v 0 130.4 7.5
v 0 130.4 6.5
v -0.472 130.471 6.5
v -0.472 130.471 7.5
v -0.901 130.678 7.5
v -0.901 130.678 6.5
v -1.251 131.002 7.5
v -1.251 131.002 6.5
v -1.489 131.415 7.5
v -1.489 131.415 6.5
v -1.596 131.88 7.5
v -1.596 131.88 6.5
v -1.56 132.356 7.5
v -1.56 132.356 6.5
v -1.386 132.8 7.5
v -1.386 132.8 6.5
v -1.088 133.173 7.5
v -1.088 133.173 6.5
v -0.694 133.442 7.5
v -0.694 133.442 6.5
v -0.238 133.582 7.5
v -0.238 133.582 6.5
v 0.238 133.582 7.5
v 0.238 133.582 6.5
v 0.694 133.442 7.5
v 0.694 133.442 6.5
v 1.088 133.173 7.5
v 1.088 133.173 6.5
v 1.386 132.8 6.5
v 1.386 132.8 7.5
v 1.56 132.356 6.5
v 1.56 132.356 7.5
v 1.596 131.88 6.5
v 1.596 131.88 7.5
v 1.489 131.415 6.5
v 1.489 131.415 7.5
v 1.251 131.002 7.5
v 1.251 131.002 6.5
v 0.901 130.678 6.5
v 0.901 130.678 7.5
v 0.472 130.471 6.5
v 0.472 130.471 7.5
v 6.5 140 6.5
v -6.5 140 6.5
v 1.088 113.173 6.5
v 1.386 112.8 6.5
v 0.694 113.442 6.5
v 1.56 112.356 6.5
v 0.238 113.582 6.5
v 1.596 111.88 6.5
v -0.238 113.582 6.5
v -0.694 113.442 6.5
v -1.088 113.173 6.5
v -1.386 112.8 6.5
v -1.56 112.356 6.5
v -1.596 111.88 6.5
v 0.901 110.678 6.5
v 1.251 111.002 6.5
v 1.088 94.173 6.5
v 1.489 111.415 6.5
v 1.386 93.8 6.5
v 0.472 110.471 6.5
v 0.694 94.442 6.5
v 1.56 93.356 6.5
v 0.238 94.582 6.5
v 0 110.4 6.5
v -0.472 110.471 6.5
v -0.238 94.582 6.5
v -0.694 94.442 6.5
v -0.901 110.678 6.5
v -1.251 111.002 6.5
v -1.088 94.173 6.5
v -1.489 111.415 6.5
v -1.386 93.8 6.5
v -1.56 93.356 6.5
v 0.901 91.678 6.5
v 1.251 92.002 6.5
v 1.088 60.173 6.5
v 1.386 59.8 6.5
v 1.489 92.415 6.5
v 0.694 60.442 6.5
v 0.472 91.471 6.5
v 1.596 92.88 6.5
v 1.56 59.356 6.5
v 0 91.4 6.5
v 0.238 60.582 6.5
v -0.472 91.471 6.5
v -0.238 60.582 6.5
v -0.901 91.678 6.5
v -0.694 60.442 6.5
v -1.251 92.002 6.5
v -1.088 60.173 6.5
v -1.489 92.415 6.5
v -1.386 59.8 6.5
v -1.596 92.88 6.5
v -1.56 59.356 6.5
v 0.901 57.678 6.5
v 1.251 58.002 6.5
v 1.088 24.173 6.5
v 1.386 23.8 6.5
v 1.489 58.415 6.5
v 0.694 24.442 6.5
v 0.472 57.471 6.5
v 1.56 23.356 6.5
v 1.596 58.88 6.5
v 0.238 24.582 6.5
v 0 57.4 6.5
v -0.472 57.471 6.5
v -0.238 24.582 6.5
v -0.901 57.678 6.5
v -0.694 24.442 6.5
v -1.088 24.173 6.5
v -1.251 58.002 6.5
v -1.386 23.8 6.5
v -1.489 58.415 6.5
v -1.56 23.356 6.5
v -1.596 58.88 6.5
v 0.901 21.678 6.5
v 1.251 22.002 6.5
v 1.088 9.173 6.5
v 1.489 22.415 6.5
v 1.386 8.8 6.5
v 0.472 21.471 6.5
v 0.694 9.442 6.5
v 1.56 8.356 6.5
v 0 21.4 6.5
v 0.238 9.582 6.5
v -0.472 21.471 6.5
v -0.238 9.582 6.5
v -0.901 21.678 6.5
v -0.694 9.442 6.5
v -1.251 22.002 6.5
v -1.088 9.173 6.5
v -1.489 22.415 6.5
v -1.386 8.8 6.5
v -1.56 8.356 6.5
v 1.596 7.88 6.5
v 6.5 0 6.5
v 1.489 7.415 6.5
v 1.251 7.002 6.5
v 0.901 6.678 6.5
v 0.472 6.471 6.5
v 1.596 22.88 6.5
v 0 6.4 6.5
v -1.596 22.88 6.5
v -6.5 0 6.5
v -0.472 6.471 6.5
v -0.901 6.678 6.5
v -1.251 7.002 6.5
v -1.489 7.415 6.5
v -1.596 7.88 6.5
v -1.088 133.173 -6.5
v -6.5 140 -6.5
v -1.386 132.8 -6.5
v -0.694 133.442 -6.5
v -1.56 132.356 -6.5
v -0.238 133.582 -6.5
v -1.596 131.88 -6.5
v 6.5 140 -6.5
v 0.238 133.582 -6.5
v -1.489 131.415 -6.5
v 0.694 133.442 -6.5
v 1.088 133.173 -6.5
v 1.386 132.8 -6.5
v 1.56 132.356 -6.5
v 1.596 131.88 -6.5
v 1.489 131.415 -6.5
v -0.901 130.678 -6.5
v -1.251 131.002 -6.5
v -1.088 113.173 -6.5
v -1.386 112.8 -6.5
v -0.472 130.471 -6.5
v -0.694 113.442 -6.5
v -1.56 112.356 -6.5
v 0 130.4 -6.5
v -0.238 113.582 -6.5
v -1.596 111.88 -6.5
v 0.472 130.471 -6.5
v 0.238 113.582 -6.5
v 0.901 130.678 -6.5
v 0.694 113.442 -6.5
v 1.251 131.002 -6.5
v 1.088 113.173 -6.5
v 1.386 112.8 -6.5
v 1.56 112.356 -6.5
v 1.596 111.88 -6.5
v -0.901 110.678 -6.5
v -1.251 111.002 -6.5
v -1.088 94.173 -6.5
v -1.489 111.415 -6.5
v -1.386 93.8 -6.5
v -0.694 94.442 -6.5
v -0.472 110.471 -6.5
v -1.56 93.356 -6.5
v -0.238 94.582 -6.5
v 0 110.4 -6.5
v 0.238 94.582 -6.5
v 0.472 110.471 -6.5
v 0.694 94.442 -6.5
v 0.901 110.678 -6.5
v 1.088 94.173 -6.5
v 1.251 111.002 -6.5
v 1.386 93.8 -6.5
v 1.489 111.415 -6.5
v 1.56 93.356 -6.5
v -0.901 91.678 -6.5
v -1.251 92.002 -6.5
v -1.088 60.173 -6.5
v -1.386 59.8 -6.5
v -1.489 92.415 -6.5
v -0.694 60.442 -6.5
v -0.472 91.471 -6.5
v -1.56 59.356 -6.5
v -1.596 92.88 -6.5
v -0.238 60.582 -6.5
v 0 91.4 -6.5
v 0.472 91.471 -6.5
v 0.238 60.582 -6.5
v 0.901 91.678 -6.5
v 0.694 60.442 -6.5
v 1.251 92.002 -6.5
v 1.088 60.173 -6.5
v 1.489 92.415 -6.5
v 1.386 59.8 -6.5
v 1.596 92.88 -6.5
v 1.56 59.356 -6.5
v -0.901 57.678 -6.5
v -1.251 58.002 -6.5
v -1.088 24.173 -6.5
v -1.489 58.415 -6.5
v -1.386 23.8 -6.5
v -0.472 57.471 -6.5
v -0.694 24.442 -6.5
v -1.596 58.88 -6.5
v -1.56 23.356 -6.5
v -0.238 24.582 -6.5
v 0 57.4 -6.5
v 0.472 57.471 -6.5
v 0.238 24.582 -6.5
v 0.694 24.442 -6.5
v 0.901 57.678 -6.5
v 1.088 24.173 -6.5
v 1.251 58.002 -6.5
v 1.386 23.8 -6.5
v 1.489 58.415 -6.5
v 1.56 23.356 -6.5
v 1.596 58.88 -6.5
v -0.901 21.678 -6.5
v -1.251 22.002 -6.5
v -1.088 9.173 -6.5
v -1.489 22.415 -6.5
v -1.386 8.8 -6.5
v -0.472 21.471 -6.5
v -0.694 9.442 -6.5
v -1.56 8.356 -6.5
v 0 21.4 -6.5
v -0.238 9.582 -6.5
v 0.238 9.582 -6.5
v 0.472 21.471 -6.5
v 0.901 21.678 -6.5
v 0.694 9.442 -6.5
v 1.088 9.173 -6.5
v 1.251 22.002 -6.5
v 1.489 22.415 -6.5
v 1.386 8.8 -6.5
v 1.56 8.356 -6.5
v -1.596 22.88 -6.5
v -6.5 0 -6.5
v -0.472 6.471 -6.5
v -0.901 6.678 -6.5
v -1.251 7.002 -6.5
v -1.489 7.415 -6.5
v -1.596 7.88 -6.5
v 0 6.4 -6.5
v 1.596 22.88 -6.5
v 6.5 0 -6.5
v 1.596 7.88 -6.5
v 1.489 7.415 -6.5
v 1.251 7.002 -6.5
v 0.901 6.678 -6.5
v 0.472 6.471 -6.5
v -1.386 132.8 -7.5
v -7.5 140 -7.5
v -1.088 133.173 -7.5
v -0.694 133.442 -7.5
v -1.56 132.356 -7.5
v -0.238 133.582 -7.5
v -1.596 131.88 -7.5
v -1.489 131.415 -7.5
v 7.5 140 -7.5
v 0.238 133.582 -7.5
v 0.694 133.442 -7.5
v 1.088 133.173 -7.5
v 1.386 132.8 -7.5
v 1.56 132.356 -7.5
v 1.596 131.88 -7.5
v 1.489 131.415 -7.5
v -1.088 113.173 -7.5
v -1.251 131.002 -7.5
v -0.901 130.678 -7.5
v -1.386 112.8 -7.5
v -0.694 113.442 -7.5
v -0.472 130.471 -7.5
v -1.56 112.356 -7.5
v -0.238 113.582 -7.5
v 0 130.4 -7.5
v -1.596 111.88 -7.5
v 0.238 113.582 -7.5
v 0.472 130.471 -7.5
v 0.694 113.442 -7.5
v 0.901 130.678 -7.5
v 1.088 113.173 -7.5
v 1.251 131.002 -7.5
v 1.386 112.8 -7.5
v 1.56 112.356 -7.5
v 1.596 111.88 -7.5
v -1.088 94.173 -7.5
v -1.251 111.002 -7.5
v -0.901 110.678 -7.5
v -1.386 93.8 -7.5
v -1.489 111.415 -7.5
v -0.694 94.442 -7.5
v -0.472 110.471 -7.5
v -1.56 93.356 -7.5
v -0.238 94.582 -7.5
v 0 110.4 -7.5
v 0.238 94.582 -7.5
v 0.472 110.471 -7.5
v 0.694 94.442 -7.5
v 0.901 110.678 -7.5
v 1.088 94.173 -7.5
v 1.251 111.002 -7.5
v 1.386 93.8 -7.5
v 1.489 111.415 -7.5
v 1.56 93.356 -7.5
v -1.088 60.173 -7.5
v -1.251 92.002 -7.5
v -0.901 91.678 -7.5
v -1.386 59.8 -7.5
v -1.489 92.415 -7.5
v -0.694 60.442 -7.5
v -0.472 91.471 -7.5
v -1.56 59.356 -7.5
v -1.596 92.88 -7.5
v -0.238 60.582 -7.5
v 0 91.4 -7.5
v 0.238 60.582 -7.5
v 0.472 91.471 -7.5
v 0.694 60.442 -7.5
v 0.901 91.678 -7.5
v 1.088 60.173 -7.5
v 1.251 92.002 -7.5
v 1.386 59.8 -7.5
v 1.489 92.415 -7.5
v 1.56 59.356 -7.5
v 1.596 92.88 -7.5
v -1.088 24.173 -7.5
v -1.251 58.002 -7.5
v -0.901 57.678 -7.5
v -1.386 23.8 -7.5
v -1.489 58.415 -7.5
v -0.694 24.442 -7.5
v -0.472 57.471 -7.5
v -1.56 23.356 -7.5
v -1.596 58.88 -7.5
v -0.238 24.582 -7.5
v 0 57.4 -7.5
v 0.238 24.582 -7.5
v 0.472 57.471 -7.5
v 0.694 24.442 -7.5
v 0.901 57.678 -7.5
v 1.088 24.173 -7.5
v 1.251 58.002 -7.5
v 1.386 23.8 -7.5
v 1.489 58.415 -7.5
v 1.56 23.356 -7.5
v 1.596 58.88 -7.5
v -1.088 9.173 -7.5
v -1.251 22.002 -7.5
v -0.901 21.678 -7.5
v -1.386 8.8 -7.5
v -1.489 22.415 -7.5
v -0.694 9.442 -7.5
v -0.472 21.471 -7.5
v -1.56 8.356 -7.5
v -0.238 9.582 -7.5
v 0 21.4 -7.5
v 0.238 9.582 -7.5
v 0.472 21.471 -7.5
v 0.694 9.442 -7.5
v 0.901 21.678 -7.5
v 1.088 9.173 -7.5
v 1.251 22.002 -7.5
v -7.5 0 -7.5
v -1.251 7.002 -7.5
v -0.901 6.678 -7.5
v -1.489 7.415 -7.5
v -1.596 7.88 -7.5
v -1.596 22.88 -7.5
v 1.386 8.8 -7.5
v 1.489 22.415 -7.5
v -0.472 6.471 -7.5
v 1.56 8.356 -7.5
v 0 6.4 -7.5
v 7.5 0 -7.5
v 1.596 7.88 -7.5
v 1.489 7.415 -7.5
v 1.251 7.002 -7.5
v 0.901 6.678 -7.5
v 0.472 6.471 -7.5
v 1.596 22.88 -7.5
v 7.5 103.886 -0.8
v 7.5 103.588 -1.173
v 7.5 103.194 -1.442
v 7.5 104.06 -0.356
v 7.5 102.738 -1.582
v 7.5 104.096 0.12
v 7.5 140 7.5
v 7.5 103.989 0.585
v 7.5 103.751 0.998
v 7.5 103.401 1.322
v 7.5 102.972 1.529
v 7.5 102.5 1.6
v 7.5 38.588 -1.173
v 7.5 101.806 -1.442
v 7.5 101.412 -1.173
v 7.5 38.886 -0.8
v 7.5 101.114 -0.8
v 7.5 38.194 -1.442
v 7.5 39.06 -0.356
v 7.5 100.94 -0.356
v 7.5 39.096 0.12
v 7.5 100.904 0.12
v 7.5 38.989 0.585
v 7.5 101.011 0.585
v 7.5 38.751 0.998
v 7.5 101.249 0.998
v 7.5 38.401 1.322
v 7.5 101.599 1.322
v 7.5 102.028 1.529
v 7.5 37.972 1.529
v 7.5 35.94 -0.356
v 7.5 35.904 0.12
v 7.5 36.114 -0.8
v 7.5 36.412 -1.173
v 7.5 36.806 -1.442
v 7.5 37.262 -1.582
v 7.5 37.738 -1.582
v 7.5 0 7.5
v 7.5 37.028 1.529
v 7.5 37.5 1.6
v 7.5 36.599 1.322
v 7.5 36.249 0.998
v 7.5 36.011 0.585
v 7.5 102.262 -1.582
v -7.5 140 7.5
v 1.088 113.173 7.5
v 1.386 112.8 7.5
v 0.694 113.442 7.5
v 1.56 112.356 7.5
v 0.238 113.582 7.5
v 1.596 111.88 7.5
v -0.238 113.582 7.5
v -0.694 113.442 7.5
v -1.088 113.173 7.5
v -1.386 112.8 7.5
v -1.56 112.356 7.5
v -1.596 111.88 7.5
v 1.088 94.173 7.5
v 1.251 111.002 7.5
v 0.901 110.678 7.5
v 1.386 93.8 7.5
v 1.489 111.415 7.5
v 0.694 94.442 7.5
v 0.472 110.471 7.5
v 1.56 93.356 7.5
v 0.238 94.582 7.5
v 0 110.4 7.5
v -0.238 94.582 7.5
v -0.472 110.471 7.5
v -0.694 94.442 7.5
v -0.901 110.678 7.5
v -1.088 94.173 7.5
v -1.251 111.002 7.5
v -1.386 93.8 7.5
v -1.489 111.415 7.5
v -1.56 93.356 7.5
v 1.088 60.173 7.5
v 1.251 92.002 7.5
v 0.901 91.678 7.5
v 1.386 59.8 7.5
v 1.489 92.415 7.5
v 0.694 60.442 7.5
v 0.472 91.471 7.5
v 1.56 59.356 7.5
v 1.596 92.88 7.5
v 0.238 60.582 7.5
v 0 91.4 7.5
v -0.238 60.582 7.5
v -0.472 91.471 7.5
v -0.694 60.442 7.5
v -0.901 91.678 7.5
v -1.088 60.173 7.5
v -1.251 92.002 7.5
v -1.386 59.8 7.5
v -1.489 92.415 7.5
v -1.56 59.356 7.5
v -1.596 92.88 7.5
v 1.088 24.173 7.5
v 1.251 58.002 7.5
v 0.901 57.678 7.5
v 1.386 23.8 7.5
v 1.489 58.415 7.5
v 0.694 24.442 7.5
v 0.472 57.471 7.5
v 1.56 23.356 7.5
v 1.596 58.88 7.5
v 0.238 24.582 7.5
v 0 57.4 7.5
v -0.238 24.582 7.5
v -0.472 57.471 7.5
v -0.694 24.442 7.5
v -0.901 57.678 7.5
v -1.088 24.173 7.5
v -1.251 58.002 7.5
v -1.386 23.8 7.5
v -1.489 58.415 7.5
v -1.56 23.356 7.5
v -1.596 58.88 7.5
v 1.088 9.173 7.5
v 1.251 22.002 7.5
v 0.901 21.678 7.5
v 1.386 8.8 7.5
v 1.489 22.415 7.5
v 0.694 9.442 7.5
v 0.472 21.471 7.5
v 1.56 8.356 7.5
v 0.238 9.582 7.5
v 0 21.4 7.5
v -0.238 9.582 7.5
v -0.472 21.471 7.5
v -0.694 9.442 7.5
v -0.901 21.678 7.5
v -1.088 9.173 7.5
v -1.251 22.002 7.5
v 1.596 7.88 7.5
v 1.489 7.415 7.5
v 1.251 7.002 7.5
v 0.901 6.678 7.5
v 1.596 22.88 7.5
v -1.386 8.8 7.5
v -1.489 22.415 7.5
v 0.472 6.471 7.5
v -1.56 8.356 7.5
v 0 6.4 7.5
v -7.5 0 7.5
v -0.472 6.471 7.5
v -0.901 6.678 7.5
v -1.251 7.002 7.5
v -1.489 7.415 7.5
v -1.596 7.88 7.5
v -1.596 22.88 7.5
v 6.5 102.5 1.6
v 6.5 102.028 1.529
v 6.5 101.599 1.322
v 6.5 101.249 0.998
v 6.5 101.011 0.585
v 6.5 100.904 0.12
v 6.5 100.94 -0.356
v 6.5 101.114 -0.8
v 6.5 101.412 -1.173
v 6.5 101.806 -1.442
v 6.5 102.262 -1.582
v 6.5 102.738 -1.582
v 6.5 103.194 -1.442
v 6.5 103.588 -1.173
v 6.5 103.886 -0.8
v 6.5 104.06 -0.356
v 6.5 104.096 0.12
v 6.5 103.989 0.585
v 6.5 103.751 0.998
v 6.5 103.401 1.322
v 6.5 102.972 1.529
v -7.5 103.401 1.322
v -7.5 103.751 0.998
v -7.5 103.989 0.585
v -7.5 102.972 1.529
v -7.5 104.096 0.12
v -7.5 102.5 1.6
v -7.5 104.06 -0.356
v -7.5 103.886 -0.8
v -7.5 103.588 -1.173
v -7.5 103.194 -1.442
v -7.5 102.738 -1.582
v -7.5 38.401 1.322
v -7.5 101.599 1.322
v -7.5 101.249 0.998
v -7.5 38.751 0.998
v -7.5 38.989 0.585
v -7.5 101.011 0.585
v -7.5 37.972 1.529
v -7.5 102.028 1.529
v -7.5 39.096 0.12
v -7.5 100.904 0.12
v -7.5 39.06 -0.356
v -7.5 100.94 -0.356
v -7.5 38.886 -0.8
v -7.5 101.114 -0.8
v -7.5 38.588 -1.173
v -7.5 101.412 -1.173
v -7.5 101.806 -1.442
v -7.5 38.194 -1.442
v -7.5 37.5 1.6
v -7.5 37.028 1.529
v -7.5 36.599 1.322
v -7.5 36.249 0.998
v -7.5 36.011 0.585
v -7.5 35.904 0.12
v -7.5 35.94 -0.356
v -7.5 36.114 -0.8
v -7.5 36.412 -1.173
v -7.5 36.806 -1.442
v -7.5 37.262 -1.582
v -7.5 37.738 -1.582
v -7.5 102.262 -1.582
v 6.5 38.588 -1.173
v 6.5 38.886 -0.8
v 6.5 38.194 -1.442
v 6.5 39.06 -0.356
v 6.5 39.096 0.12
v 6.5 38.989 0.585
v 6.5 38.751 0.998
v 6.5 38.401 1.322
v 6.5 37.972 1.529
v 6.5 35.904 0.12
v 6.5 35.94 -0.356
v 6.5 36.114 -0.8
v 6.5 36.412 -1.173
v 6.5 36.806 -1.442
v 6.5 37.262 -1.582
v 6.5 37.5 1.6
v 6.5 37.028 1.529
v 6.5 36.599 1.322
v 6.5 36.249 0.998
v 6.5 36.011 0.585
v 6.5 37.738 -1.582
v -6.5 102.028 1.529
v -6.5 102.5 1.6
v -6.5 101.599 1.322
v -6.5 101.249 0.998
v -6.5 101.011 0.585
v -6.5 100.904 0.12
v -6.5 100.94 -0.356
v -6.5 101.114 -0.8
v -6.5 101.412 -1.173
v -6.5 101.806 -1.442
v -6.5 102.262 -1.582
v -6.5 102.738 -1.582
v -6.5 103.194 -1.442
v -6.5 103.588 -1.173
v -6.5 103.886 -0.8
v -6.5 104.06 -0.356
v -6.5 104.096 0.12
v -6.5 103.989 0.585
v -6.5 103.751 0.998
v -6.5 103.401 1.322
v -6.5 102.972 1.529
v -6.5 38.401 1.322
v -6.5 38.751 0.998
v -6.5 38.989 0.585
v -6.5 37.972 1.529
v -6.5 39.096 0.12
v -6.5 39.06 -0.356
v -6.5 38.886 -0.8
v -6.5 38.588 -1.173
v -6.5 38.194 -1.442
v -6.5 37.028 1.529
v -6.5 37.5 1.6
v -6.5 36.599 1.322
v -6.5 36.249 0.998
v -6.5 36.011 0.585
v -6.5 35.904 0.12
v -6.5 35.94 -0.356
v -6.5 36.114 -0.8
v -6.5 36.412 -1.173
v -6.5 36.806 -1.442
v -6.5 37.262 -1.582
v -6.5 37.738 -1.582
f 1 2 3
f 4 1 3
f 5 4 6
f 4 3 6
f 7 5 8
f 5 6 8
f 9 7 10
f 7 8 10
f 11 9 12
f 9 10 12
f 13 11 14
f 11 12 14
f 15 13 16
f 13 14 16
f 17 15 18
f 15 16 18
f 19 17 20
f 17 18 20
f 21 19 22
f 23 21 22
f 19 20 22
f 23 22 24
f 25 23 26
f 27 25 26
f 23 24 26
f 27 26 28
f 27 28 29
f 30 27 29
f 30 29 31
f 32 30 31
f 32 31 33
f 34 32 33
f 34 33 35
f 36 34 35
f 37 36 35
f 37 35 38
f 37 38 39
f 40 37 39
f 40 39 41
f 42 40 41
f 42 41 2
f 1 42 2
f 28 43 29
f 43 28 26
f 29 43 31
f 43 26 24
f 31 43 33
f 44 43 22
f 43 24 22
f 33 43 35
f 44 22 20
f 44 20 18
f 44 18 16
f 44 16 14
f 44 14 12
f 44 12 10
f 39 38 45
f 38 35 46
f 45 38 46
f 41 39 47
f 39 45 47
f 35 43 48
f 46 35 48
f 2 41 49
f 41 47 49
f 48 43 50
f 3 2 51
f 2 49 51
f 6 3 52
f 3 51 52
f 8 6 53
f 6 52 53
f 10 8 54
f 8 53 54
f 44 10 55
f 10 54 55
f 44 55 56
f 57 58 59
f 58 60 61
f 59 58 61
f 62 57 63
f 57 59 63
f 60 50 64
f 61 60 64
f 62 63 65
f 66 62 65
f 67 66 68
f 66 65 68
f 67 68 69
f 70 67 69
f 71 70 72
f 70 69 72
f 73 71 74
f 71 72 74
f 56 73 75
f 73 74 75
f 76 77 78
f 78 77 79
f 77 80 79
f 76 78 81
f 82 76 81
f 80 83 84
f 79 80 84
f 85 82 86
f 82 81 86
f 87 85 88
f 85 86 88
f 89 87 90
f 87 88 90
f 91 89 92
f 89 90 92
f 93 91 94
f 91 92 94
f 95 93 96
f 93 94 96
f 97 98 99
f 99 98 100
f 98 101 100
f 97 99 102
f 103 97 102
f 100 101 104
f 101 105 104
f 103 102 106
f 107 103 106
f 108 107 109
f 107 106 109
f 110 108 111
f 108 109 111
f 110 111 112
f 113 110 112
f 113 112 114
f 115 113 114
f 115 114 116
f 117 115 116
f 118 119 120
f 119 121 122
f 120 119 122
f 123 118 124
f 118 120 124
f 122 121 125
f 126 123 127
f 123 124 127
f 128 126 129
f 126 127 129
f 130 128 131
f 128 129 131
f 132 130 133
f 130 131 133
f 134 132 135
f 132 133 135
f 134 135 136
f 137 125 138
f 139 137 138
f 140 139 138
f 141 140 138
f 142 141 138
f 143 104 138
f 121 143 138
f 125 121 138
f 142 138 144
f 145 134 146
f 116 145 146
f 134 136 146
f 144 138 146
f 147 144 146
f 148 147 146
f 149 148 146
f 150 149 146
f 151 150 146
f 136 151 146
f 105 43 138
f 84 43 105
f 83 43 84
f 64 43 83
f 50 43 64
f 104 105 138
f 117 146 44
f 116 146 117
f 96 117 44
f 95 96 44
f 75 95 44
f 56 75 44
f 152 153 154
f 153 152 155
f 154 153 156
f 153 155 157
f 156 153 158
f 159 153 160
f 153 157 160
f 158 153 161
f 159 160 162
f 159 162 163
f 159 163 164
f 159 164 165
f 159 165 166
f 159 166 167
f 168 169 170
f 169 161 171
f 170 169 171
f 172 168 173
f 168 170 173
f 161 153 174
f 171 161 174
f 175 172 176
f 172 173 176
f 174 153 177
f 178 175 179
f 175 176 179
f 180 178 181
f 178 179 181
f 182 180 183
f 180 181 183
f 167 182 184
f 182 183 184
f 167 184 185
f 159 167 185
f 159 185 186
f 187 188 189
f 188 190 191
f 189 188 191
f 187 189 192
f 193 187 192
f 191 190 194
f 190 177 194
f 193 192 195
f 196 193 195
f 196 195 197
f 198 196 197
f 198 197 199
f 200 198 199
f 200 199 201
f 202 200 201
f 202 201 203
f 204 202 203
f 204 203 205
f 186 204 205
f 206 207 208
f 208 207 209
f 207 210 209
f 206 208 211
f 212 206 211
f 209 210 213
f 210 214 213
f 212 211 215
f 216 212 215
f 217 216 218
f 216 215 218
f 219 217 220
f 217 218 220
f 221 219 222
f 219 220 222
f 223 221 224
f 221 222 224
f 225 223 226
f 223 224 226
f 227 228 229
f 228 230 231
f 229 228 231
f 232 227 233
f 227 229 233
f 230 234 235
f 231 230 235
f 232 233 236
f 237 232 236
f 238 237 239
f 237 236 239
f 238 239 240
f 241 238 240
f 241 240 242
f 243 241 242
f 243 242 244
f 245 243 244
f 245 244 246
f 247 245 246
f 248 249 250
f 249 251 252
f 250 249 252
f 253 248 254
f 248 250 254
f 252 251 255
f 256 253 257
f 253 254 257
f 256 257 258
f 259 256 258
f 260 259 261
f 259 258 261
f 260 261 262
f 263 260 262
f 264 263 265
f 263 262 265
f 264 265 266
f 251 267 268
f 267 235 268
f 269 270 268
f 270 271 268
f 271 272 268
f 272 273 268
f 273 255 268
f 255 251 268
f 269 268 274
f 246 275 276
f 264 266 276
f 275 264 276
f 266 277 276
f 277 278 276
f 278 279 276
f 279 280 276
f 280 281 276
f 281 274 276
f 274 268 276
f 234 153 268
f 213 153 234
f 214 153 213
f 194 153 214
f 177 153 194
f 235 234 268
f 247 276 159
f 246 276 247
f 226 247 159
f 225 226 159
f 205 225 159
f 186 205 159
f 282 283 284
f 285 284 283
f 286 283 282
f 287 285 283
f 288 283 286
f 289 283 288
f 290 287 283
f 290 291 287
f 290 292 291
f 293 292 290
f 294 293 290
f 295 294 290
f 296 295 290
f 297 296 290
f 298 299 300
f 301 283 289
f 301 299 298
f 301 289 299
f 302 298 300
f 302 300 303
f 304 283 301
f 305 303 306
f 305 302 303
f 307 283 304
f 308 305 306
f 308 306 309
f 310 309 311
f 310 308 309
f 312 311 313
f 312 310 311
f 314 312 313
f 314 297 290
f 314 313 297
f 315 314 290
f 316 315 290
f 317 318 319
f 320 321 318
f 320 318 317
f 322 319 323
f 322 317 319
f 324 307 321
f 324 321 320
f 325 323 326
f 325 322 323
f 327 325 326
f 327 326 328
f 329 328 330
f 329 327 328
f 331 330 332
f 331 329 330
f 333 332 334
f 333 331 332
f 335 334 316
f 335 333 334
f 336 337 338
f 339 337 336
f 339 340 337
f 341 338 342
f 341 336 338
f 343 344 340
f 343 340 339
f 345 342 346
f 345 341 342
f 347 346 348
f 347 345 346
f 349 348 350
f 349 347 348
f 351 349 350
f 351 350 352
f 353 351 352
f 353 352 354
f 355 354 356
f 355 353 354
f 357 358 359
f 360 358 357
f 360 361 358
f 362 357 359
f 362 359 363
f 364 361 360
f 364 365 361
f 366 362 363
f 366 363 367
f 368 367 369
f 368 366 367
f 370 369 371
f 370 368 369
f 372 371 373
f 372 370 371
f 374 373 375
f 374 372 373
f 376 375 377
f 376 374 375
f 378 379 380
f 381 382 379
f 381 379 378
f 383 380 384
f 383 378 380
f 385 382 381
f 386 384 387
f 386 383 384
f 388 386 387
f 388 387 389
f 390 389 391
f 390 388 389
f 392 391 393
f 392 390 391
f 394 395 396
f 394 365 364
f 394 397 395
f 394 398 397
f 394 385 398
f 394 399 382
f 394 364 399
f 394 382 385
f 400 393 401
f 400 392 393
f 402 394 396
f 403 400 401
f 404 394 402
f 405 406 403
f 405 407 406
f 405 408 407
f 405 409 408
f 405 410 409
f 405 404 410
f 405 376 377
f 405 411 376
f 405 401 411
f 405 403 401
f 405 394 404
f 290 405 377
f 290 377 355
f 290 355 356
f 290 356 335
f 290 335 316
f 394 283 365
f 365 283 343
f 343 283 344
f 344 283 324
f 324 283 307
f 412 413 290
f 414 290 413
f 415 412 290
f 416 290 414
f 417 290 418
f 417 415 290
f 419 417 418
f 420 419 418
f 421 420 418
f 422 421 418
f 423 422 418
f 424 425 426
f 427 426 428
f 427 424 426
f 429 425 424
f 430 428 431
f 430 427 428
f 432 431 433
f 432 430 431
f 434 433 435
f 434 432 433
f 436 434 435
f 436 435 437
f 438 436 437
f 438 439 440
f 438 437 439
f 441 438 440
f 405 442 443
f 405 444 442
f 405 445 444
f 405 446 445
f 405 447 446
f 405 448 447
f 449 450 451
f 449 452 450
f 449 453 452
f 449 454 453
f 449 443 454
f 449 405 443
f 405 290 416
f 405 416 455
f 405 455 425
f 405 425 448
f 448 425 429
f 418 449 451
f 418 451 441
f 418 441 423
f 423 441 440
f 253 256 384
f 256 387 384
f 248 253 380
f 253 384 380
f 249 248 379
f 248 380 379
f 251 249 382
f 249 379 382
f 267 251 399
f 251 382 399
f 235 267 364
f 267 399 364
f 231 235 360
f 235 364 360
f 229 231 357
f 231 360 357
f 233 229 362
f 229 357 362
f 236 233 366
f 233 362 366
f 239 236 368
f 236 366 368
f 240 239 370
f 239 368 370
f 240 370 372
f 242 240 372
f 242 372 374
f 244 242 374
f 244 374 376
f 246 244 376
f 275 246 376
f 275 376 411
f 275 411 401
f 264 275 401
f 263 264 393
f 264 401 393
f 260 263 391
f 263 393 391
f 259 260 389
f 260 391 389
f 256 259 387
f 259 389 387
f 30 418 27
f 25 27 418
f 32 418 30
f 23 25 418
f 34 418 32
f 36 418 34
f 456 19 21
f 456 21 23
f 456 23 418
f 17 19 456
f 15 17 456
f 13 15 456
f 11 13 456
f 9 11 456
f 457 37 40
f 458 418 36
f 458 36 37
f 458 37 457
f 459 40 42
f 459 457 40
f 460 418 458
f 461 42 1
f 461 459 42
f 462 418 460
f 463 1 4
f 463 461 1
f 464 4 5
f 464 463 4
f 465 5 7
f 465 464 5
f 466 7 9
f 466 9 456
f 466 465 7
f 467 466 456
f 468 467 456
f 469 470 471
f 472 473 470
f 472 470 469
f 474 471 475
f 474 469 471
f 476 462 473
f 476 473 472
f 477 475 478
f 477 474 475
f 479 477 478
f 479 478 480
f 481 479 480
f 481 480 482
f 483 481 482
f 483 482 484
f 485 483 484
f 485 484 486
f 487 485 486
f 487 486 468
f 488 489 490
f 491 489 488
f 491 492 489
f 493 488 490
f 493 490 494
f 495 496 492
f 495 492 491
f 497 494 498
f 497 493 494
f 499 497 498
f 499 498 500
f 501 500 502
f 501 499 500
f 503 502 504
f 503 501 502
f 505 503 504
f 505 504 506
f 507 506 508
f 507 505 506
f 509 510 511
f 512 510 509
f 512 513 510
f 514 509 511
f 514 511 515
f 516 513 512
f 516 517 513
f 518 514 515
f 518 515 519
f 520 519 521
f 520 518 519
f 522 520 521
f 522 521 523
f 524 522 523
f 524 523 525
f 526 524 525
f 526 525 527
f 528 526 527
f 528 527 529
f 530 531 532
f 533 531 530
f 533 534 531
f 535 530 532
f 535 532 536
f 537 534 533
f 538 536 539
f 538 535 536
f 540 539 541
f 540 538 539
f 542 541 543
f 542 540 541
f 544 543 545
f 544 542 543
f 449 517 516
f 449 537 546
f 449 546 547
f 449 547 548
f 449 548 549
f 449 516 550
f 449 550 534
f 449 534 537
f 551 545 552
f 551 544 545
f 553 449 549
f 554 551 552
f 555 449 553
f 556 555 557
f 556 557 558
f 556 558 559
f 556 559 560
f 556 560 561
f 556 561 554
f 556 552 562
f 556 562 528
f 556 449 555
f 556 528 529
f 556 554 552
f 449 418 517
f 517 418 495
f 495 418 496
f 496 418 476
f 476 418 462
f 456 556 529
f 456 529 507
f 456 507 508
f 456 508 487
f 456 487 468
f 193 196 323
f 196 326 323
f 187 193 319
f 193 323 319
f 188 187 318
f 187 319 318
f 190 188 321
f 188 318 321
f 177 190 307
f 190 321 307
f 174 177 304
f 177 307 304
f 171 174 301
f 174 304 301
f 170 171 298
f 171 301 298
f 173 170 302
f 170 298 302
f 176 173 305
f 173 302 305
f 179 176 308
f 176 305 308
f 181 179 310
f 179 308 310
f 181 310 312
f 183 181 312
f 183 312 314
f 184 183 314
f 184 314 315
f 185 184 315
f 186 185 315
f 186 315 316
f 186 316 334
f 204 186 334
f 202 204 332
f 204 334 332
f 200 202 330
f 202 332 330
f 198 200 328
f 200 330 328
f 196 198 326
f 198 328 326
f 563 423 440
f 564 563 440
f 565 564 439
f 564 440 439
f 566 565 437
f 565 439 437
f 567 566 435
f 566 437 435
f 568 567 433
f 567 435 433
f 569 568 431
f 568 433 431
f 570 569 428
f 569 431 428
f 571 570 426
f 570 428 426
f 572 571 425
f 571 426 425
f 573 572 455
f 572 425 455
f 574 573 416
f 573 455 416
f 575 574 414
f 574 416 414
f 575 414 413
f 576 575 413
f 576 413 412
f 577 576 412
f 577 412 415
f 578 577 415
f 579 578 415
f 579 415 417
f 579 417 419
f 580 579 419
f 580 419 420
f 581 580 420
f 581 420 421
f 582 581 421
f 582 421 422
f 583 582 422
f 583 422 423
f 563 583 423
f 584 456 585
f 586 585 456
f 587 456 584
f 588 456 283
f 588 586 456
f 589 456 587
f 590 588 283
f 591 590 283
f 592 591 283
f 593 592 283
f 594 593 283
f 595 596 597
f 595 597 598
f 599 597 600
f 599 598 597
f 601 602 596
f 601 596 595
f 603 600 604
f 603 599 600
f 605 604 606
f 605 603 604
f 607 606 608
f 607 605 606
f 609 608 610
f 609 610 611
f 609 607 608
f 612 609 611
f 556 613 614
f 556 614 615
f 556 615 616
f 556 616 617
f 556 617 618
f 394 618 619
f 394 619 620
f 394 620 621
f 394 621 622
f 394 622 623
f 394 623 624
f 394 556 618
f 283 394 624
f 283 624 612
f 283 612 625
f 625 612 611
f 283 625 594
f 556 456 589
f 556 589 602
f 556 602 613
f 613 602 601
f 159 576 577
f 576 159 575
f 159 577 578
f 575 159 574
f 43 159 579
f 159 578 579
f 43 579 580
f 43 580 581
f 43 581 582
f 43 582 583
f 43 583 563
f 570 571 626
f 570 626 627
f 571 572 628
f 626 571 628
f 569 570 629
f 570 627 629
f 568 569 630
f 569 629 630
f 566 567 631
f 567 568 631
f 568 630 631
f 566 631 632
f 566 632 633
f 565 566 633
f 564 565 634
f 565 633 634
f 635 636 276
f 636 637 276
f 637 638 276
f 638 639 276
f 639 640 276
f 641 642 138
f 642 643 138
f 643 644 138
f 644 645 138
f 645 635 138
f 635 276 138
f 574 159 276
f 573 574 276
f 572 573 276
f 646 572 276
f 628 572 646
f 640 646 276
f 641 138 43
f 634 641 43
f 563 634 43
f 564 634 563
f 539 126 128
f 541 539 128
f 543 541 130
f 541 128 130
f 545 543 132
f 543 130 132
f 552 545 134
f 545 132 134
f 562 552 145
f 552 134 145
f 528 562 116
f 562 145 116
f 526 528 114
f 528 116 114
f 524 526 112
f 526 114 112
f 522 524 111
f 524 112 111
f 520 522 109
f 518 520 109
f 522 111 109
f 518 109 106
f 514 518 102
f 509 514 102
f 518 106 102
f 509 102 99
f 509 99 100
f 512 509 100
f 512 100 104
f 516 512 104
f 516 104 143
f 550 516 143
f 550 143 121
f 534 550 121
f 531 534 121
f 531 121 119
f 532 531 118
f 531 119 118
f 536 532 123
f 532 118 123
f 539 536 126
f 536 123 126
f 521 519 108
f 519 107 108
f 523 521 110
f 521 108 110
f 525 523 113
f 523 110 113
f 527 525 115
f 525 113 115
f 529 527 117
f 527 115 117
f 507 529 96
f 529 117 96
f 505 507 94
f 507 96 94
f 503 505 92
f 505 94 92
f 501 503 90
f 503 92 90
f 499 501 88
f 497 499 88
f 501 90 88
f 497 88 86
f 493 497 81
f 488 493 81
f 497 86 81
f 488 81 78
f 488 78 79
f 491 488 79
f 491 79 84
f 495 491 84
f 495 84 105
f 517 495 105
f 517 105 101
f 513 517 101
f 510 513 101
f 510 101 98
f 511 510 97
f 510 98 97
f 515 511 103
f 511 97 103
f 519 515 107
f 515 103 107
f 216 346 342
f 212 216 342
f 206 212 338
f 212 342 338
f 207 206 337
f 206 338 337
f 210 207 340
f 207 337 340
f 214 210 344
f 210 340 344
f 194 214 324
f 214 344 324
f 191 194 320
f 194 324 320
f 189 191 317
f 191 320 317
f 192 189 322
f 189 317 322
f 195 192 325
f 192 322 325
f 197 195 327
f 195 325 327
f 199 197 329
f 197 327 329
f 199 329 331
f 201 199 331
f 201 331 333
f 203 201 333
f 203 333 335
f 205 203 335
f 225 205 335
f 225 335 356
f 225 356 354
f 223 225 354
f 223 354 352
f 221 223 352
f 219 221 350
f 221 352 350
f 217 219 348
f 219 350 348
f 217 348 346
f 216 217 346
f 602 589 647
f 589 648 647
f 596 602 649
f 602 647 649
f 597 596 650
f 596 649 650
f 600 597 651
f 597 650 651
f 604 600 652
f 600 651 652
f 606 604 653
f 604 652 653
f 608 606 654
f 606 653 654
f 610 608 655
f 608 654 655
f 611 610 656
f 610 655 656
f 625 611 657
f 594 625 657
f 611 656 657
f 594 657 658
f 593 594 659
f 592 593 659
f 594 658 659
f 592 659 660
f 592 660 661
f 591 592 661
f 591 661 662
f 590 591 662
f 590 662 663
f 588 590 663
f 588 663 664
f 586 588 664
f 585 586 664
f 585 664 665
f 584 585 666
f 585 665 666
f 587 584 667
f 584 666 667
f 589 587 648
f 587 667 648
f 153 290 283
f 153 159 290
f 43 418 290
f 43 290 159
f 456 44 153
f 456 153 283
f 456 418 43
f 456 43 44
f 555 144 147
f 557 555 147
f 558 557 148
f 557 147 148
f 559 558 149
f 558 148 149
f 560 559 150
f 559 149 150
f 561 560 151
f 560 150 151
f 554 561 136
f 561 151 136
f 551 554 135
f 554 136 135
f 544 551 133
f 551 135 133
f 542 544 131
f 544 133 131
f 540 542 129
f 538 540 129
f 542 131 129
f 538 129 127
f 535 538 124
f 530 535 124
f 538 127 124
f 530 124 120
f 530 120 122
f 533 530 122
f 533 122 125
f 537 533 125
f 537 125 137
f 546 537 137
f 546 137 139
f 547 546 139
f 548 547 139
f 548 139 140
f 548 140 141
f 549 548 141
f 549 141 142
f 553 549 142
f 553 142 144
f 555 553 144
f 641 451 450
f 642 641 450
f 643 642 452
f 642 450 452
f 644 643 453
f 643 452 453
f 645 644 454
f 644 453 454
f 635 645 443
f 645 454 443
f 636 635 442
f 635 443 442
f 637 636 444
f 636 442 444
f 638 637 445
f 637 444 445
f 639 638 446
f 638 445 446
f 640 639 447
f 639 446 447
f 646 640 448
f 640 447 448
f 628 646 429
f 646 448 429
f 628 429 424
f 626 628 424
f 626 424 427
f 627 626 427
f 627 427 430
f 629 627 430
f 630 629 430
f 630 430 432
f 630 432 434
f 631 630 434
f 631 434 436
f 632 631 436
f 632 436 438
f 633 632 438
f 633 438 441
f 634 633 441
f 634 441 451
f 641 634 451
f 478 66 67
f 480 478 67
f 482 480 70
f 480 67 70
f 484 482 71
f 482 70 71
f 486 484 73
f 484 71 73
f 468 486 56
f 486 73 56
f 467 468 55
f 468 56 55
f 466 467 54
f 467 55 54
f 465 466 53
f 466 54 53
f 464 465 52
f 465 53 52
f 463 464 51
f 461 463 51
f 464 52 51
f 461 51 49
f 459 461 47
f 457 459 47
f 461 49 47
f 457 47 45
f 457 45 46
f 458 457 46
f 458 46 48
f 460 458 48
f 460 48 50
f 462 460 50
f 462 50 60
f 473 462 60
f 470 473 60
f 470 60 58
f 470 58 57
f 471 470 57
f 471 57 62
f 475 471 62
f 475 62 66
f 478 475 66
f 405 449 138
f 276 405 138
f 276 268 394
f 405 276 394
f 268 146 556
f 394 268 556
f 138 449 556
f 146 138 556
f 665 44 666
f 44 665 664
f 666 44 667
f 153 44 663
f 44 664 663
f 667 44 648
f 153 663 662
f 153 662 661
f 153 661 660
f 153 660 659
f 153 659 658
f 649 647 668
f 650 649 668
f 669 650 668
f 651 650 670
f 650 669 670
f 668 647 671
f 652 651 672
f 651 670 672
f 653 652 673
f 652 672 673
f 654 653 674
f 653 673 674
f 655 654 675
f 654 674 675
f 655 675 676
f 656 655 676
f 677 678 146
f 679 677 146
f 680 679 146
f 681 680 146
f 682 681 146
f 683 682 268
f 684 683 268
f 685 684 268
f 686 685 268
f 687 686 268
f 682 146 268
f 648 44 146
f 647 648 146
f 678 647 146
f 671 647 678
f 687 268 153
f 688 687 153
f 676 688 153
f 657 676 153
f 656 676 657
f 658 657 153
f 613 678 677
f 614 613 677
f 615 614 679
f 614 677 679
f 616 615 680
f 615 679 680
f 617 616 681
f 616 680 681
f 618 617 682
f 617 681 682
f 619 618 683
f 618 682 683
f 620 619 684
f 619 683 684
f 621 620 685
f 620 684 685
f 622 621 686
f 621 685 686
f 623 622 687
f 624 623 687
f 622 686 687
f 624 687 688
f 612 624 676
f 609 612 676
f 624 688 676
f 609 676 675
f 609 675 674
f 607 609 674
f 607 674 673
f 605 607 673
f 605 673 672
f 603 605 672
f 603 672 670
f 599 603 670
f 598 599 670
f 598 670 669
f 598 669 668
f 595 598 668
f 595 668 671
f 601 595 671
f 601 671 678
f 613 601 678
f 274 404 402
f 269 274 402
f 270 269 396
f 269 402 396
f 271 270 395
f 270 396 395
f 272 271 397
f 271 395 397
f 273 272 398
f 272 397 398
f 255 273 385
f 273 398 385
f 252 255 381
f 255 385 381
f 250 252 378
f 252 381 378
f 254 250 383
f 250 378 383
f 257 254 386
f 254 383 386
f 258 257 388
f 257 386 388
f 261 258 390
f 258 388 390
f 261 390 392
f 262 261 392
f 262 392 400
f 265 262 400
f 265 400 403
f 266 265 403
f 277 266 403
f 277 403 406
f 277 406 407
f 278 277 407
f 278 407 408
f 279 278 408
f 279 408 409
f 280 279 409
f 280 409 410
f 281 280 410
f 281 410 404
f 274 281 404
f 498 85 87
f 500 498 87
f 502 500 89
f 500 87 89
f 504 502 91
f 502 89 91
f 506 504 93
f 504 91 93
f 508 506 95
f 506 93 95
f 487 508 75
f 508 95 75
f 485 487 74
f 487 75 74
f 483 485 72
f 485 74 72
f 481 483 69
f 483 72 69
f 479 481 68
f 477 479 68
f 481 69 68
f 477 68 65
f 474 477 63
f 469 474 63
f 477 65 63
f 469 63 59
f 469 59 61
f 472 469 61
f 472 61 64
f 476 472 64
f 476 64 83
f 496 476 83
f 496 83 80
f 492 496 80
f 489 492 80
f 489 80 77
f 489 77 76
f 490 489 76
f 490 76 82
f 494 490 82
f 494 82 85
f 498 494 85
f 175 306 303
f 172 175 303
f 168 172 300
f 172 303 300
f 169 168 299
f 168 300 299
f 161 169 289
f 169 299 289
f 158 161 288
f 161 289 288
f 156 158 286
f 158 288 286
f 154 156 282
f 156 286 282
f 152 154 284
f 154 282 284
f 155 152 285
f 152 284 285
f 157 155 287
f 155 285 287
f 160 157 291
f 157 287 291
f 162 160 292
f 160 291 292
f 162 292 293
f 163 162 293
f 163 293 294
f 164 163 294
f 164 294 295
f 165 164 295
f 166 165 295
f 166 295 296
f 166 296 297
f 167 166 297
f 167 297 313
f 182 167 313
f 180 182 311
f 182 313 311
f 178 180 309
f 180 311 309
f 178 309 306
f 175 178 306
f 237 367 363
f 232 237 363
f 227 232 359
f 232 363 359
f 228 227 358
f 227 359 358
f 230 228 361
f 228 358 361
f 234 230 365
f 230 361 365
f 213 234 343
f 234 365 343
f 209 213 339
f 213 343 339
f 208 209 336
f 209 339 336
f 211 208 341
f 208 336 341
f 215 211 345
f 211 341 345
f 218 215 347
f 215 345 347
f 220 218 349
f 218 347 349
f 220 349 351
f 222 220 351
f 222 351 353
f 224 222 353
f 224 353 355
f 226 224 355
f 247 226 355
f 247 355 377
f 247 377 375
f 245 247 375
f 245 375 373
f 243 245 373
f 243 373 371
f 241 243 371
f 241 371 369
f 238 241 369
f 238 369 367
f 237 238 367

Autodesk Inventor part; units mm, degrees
ref_plane "YZ Plane" through (0, 0, 0) normal (1, 0, 0) x (0, 1, 0)
ref_plane "XZ Plane" through (0, 0, 0) normal (0, 1, 0) x (-1, 0, 0)
ref_plane "XY Plane" through (0, 0, 0) normal (0, 0, 1) x (1, 0, 0)
sketch "スケッチ1" plane through (0, 0, 0) normal (0, 1, 0) x (-1, 0, 0)
  line L0 (7.5, -7.5) -> (-7.5, -7.5)
  line L1 (-7.5, -7.5) -> (-7.5, 7.5)
  line L2 (-7.5, 7.5) -> (7.5, 7.5)
  line L3 (7.5, 7.5) -> (7.5, -7.5)
  line L4 (7.5, -7.5) -> (-7.5, 7.5) construction
  line L5 (-7.5, -7.5) -> (7.5, 7.5) construction
  point P0 (0, 0)
  dimension "d0" = 15
  dimension "d1" = 15
extrude "押し出し1" add sketch "スケッチ1" along normal blind 140
shell "シェル1" thickness 1 removed faces 2 at (-2.5, 0, -2.5) at (-2.5, 140, -2.5)
sketch "スケッチ2" plane through (-7.5, 0, 7.5) normal (0, 0, 1) x (1, 0, 0)
  line L0 (15, 0) -> (0, 0) projected
  line L1 (0, 140) -> (15, 140) projected
  point P0 (7.5, 0)
  point P1 (7.5, 8)
  point P2 (7.5, 23)
  point P3 (7.5, 0)
  point P4 (7.5, 132)
  point P5 (7.5, 112)
  point P6 (7.5, 140)
  dimension "d5" = 8
  dimension "d6" = 15
  dimension "d14" = 8
  dimension "d15" = 20
hole "穴1" at (0, 8, 7.5) at (0, 23, 7.5) at (0, 132, 7.5) at (0, 112, 7.5) direction (0, 0, -1) diameter 3.2 end through all
sketch "スケッチ3" plane through (-7.5, 0, -7.5) normal (-1, 0, 0) x (0, 0, 1)
  line L0 (15, 0) -> (0, 0) projected
  point P0 (7.5, 0)
  point P1 (7.5, 37.5)
  point P2 (7.5, 102.5)
  point P3 (7.5, 0)
  point P4 (7.5, 0)
  dimension "d16" = 37.5
  dimension "d17" = 65
hole "穴2" at (-7.5, 37.5, 0) at (-7.5, 102.5, 0) direction (1, 0, 0) diameter 3.2 end through all
sketch "スケッチ4" plane through (-7.5, 0, 7.5) normal (0, 0, 1) x (1, 0, 0)
  circle A0 centre (94.8138, 137.4022) radius 1.6
  circle A1 centre (-2.6682, 183.8917) radius 1.6
  circle A2 centre (99.3065, 100.3608) radius 1.6
  circle A3 centre (1.8246, 146.8503) radius 1.6
  circle A4 centre (7.5, 112) radius 1.2295
  circle A5 centre (7.5, 132) radius 1.2295
  line L0 (112.2687, 136.8332) -> (109.5609, 138.1246)
  arc A6 (110.4218, 139.9298) -> (109.5609, 138.1246) centre (109.9914, 139.0272) ccw
  line L1 (110.4218, 139.9298) -> (112.1436, 143.5402)
  arc A7 (113.8704, 143.6762) -> (112.1436, 143.5402) centre (113.0463, 143.1098) ccw
  arc A8 (114.8515, 142.2489) -> (113.8704, 143.6762) centre (113.9489, 142.6793) ccw
  line L2 (114.8515, 142.2489) -> (113.1296, 138.6384)
  arc A9 (112.2687, 136.8332) -> (113.1296, 138.6384) centre (112.6992, 137.7358) ccw
  line L3 (120.017, 153.0802) -> (118.2951, 149.4697)
  arc A10 (116.5684, 149.3337) -> (118.2951, 149.4697) centre (117.3925, 149.9002) ccw
  arc A11 (115.5873, 150.7611) -> (116.5684, 149.3337) centre (116.4899, 150.3307) ccw
  line L4 (115.5873, 150.7611) -> (117.3091, 154.3716)
  arc A12 (118.1701, 156.1768) -> (117.3091, 154.3716) centre (117.7396, 155.2742) ccw
  line L5 (118.1701, 156.1768) -> (120.8779, 154.8854)
  arc A13 (120.017, 153.0802) -> (120.8779, 154.8854) centre (120.4474, 153.9828) ccw
  line L6 (106.2423, 124.1966) -> (103.5345, 125.488)
  arc A14 (104.3954, 127.2932) -> (103.5345, 125.488) centre (103.9649, 126.3906) ccw
  line L7 (104.3954, 127.2932) -> (106.1172, 130.9037)
  arc A15 (107.8439, 131.0397) -> (106.1172, 130.9037) centre (107.0198, 130.4732) ccw
  arc A16 (108.8251, 129.6123) -> (107.8439, 131.0397) centre (107.9225, 130.0428) ccw
  line L8 (108.8251, 129.6123) -> (107.1032, 126.0019)
  arc A17 (106.2423, 124.1966) -> (107.1032, 126.0019) centre (106.6728, 125.0992) ccw
  circle A18 centre (51.5477, 186.0658) radius 1.6
  circle A19 centre (60.463, 120.5473) radius 1.5
  circle A20 centre (40.987, 157.5329) radius 1.5
  circle A21 centre (30.2256, 134.9676) radius 1.5
  circle A22 centre (71.2245, 143.1126) radius 1.5
  circle A23 centre (72.3508, 176.2555) radius 1.25
  circle A24 centre (94.0134, 165.9245) radius 1.25
  arc A25 (80.796, 100.4622) -> (79.0196, 101.3811) centre (79.9078, 100.9217) ccw
  line L9 (80.796, 100.4622) -> (75.2827, 89.8038)
  arc A26 (73.5063, 90.7226) -> (75.2827, 89.8038) centre (74.3945, 90.2632) ccw
  line L10 (73.5063, 90.7226) -> (64.6242, 95.3171)
  arc A27 (62.8478, 96.2359) -> (64.6242, 95.3171) centre (63.736, 95.7765) ccw
  line L11 (62.8478, 96.2359) -> (68.3611, 106.8944)
  arc A28 (70.1375, 105.9755) -> (68.3611, 106.8944) centre (69.2493, 106.435) ccw
  line L12 (70.1375, 105.9755) -> (79.0196, 101.3811)
  circle A29 centre (28.7854, 103.2592) radius 1.5
  circle A30 centre (67.6869, 90.3552) radius 1.5
  circle A31 centre (75.9568, 106.343) radius 1.5
  circle A32 centre (31.7101, 121.02) radius 1.5
  line L13 (38.1296, 116.9224) -> (36.1798, 105.0819)
  arc A33 (34.2064, 105.4069) -> (36.1798, 105.0819) centre (35.1931, 105.2444) ccw
  line L14 (34.2064, 105.4069) -> (24.3393, 107.0317)
  arc A34 (22.3659, 107.3567) -> (24.3393, 107.0317) centre (23.3526, 107.1942) ccw
  line L15 (22.3659, 107.3567) -> (24.3157, 119.1972)
  arc A35 (26.2891, 118.8723) -> (24.3157, 119.1972) centre (25.3024, 119.0347) ccw
  line L16 (26.2891, 118.8723) -> (36.1562, 117.2474)
  arc A36 (38.1296, 116.9224) -> (36.1562, 117.2474) centre (37.1429, 117.0849) ccw
  circle A37 centre (-0.9114, 173.6368) radius 1.6
  circle A38 centre (91.1549, 129.73) radius 1.6
  arc A39 (89.211, 114.0386) -> (91.0163, 113.1777) centre (90.1137, 113.6081) ccw
  line L17 (89.211, 114.0386) -> (80.1849, 118.3432)
  arc A40 (78.3797, 119.2041) -> (80.1849, 118.3432) centre (79.2823, 118.7736) ccw
  line L18 (78.3797, 119.2041) -> (83.5452, 130.0354)
  arc A41 (85.3504, 129.1745) -> (83.5452, 130.0354) centre (84.4478, 129.605) ccw
  line L19 (85.3504, 129.1745) -> (94.3765, 124.8699)
  arc A42 (96.1818, 124.009) -> (94.3765, 124.8699) centre (95.2792, 124.4395) ccw
  line L20 (96.1818, 124.009) -> (91.0163, 113.1777)
  arc A43 (-6.7159, 173.0812) -> (-8.5211, 173.9421) centre (-7.6185, 173.5117) ccw
  line L21 (-6.7159, 173.0812) -> (2.3103, 168.7766)
  arc A44 (4.1155, 167.9157) -> (2.3103, 168.7766) centre (3.2129, 168.3462) ccw
  line L22 (4.1155, 167.9157) -> (-1.05, 157.0844)
  arc A45 (-2.8552, 157.9453) -> (-1.05, 157.0844) centre (-1.9526, 157.5148) ccw
  line L23 (-2.8552, 157.9453) -> (-11.8813, 162.2499)
  arc A46 (-13.6866, 163.1108) -> (-11.8813, 162.2499) centre (-12.784, 162.6803) ccw
  line L24 (-13.6866, 163.1108) -> (-8.5211, 173.9421)
  circle A47 centre (83.4066, 113.4831) radius 1.6
  circle A48 centre (-8.6597, 157.3898) radius 1.6
  circle A49 centre (9.0871, 193.022) radius 1.25
  circle A50 centre (11.8045, 158.4877) radius 1.25
  circle A51 centre (40.3533, 178.1082) radius 1.25
  circle A52 centre (60.4103, 159.3488) radius 1.2295
  circle A53 centre (78.2541, 161.9181) radius 1.2295
  circle A54 centre (51.1757, 174.8318) radius 1.2295
  arc A55 (-2.9, 96) -> (-6, 96) centre (-4.45, 96) ccw
  line L25 (-2.9, 96) -> (-2.9, 90)
  arc A56 (-6, 90) -> (-2.9, 90) centre (-4.45, 90) ccw
  line L26 (-6, 90) -> (-6, 96)
  circle A57 centre (49.5584, 72.8565) radius 1.6
  circle A58 centre (7.5, 59) radius 1.25
  circle A59 centre (7.5, 93) radius 1.25
  arc A60 (-2.9, 62) -> (-6, 62) centre (-4.45, 62) ccw
  line L27 (-2.9, 62) -> (-2.9, 56)
  arc A61 (-6, 56) -> (-2.9, 56) centre (-4.45, 56) ccw
  line L28 (-6, 56) -> (-6, 62)
  arc A62 (0, 103) -> (0, 106) centre (0, 104.5) ccw
  line L29 (-9, 103) -> (0, 103)
  line L30 (-9, 83) -> (-9, 103)
  line L31 (0, 83) -> (-9, 83)
  arc A63 (0, 80) -> (0, 83) centre (0, 81.5) ccw
  line L32 (0, 80) -> (0, 72)
  arc A64 (0, 69) -> (0, 72) centre (0, 70.5) ccw
  line L33 (-9, 69) -> (0, 69)
  line L34 (-9, 49) -> (-9, 69)
  line L35 (0, 49) -> (-9, 49)
  arc A65 (0, 46) -> (0, 49) centre (0, 47.5) ccw
  line L36 (0, 46) -> (0, 42)
  arc A66 (0, 42) -> (1.4237, 42.3594) centre (0, 45) ccw
  line L37 (1.4237, 42.3594) -> (101.4896, 96.3119)
  arc A67 (101.4896, 96.3119) -> (103.6033, 98.7183) centre (99.3065, 100.3608) ccw
  line L38 (124.1837, 152.5545) -> (103.6033, 98.7183)
  arc A68 (124.1837, 152.5545) -> (122.1359, 157.6089) centre (120.4474, 153.9828) ccw
  line L39 (53.2362, 189.6919) -> (122.1359, 157.6089)
  arc A69 (53.2362, 189.6919) -> (48.9495, 189.107) centre (51.5477, 186.0658) ccw
  line L40 (38.5483, 180.221) -> (48.9495, 189.107)
  arc A70 (38.5483, 180.221) -> (37.5746, 178.1426) centre (40.3533, 178.1082) ccw
  arc A71 (35.9884, 171.3281) -> (37.5746, 178.1426) centre (21.2759, 178.3445) ccw
  line L41 (35.9884, 171.3281) -> (35.1275, 169.5229)
  arc A72 (5.7024, 183.5558) -> (35.1275, 169.5229) centre (20.415, 176.5393) ccw
  line L42 (5.7024, 183.5558) -> (6.5633, 185.361)
  arc A73 (10.8623, 190.8844) -> (6.5633, 185.361) centre (21.2759, 178.3445) ccw
  arc A74 (10.8623, 190.8844) -> (7.898, 195.5334) centre (9.0871, 193.022) ccw
  line L43 (-5.2359, 189.3145) -> (7.898, 195.5334)
  arc A75 (-5.2359, 189.3145) -> (-8.284, 186.0042) centre (-2.6682, 183.8917) ccw
  line L44 (-16.5278, 164.0887) -> (-8.284, 186.0042)
  arc A76 (-16.5278, 164.0887) -> (-16.5876, 161.4424) centre (-12.784, 162.6803) ccw
  line L45 (-16.5876, 161.4424) -> (-0.1473, 110.9284)
  arc A77 (0, 110) -> (-0.1473, 110.9284) centre (-3, 110) ccw
  line L46 (0, 110) -> (0, 106)
  point P0 (7.5, 0)
hole "穴3" at (0, 59, 7.5) at (0, 93, 7.5) direction (0, 0, -1) diameter 3.2 end through all
properties part number "PitchSquarePipe2" material "アルミニウム 5005-H12"
